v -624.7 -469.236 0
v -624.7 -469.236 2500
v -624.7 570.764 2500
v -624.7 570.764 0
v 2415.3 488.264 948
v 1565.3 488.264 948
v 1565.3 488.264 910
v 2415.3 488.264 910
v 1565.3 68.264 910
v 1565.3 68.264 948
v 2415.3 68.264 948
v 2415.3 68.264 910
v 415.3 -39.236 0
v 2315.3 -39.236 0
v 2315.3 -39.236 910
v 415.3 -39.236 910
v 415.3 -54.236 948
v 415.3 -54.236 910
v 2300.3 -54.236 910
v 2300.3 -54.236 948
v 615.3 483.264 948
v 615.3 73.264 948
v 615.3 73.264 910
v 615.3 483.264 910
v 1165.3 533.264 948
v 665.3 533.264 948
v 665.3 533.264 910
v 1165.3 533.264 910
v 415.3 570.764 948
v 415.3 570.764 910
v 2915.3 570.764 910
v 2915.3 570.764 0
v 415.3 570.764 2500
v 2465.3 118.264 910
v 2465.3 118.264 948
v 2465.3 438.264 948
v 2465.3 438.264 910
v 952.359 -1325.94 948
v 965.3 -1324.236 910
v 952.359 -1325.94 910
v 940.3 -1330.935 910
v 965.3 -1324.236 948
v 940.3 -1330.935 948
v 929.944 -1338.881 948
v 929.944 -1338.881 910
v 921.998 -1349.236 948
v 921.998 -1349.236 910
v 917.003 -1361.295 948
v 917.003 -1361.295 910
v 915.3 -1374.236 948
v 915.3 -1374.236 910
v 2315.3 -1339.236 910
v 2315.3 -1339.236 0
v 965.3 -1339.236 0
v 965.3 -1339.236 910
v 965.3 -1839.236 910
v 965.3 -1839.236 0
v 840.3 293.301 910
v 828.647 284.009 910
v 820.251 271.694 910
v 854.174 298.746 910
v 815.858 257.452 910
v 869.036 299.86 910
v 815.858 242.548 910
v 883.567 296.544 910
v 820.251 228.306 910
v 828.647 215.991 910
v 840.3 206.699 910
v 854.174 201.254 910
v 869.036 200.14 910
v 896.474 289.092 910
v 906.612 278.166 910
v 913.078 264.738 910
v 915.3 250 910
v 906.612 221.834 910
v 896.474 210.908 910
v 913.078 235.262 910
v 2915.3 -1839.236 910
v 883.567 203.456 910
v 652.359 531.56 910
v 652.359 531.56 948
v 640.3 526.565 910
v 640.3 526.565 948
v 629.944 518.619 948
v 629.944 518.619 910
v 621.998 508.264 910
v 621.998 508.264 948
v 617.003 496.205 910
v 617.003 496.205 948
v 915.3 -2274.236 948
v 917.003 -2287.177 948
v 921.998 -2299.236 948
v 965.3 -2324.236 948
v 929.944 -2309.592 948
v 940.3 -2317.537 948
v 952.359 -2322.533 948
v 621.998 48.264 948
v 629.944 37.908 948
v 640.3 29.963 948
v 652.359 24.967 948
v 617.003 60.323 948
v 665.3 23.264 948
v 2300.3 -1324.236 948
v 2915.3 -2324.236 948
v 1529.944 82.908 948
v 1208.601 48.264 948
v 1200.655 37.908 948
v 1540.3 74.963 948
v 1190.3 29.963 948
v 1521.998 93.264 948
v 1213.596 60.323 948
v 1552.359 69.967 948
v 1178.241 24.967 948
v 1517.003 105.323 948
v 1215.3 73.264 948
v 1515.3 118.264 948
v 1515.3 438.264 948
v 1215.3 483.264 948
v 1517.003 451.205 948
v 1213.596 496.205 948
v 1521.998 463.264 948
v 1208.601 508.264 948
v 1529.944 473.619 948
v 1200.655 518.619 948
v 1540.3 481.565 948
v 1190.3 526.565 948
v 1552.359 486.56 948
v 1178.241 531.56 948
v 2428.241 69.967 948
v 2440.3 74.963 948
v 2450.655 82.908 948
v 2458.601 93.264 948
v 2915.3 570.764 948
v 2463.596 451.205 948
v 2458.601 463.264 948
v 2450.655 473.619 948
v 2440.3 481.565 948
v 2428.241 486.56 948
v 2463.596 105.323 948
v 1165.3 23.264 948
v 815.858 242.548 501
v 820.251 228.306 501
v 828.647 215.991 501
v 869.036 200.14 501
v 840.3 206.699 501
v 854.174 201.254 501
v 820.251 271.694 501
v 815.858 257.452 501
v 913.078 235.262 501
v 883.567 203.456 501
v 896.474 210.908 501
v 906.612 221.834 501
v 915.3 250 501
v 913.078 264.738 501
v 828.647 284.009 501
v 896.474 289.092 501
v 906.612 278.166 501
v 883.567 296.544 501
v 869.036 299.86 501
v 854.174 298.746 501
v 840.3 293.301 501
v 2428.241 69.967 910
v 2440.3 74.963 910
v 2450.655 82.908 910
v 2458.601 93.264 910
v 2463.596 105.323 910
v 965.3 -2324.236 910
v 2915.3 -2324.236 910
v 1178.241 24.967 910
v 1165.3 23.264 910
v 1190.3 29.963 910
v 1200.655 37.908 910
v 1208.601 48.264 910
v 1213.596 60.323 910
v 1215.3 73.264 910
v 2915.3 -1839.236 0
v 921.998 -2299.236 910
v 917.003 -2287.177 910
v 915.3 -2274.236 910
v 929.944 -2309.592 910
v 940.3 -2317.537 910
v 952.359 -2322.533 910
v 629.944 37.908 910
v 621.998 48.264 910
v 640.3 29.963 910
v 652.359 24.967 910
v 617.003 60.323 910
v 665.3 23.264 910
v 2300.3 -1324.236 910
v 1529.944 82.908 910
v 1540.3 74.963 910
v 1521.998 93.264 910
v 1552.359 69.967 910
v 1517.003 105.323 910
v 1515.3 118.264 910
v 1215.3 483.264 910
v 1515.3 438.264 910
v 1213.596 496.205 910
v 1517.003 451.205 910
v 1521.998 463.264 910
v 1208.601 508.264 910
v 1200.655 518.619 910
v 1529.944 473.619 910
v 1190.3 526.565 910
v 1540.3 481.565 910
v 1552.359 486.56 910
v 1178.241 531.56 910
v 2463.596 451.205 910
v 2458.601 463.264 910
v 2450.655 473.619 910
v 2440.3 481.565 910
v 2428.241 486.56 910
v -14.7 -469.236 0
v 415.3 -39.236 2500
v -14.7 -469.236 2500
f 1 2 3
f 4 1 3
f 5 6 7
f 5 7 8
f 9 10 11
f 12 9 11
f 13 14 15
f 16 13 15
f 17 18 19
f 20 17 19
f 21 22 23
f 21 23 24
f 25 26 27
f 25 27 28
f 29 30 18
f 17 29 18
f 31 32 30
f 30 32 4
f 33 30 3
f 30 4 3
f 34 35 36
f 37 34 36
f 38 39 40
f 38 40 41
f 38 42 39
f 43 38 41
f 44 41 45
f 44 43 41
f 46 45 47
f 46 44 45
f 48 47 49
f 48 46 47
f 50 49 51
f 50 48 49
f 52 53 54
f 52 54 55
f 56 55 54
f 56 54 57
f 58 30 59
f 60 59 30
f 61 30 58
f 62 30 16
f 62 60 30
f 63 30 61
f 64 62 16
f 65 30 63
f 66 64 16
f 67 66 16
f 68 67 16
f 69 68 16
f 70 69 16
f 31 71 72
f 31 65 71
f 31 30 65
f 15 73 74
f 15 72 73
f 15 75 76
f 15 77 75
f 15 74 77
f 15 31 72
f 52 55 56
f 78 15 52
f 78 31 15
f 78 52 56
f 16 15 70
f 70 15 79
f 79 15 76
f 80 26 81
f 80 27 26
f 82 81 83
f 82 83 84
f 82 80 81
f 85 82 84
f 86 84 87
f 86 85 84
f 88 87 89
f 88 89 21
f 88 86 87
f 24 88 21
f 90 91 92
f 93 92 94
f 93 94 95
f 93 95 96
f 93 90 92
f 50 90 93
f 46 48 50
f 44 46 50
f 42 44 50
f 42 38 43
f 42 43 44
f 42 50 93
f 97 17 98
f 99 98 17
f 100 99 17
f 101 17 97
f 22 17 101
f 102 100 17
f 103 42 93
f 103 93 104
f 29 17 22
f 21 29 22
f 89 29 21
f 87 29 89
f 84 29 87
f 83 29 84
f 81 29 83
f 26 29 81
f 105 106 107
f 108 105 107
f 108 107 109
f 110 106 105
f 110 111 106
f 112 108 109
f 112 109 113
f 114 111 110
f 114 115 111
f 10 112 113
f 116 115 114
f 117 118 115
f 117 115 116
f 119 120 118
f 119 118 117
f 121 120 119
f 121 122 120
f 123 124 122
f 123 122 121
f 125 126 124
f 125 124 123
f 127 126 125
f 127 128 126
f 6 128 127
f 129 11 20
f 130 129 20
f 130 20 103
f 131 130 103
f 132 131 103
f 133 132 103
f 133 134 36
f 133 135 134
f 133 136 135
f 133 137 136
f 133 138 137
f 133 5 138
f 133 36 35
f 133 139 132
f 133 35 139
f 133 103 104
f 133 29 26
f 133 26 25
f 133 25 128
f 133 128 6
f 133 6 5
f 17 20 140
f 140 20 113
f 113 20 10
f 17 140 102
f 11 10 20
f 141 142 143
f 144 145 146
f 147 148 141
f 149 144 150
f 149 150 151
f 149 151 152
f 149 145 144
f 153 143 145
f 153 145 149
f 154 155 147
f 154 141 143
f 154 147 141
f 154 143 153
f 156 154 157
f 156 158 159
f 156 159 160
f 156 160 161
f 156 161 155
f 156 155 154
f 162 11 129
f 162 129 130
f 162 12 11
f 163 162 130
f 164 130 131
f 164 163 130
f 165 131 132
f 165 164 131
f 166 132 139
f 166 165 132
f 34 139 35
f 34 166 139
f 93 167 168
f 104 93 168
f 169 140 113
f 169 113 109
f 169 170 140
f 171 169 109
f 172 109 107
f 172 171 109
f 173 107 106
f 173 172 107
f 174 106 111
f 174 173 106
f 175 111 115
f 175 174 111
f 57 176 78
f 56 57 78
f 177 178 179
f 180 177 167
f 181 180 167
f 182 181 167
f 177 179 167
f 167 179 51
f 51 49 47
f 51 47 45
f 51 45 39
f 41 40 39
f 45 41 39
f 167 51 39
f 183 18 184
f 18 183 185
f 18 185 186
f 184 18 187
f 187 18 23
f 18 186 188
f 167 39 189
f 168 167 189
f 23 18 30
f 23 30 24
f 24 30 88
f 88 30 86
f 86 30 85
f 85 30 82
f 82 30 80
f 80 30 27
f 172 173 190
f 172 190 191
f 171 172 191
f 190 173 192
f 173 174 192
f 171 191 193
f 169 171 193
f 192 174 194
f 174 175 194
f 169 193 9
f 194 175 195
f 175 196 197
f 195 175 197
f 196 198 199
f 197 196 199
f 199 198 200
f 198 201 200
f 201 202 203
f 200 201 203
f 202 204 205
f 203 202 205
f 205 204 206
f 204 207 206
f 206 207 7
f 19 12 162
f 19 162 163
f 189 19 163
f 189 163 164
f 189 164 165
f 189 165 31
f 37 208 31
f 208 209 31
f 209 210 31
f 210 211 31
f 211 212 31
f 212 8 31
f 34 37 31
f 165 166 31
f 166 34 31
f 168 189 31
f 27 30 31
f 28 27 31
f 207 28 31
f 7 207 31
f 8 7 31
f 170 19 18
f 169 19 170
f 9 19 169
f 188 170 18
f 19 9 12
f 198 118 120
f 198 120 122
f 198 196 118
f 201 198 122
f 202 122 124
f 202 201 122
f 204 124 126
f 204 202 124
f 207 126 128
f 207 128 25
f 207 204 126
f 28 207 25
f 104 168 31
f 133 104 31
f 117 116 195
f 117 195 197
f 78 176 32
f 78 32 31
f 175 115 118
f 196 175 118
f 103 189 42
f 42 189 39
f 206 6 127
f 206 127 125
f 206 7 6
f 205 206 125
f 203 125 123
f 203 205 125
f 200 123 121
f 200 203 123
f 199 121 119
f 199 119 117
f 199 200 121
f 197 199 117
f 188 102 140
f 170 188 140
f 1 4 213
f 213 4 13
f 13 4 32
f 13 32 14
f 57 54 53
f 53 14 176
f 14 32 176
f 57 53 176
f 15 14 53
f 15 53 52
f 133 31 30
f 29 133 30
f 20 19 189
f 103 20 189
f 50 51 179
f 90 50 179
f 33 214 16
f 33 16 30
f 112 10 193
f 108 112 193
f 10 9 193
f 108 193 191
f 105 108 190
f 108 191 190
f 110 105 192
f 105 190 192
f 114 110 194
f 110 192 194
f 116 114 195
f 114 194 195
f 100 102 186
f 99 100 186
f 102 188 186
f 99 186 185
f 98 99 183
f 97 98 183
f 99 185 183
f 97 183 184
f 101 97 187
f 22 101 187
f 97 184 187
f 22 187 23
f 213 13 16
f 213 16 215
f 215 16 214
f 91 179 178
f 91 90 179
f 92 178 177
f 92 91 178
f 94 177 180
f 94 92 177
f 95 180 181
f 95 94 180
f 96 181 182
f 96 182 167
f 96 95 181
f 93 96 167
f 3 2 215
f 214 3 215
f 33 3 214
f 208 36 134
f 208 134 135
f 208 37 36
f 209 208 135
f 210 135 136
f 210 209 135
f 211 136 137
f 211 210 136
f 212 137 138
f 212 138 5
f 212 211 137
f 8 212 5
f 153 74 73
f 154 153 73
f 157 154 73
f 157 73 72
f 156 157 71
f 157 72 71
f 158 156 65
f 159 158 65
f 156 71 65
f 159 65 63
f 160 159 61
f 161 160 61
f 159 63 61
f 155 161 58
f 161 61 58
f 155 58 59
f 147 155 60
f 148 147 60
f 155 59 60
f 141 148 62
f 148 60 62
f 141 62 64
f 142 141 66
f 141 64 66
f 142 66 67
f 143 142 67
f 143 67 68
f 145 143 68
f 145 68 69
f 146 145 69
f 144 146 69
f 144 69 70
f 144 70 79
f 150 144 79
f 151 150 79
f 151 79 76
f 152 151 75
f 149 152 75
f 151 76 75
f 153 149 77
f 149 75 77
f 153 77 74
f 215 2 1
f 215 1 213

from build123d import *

# Parameters (mm, degrees)
F0_W      = 1040
F0_H      = 1040
F1_DEPTH  = 2500
F2_SIZE   = 430
F3_W      = 610
F3_H      = 910
F4_DEPTH  = 2500
F5_W      = 600
F5_H      = 910
F6_DEPTH  = 1800
F7_W      = 500
F7_H      = 910
F8_DEPTH  = 1400
F10_DEPTH = 38
F11_R     = 50
F12_W     = 500
F12_H     = 910
F13_DEPTH = 50
F14_R     = 50
F15_DEPTH = 409
F16_W     = 600
F16_H     = 510
F17_DEPTH = 38
F18_R     = 50
F19_W     = 950
F19_H     = 420
F20_DEPTH = 38
F21_R     = 50


with BuildPart() as f1:
    # F0 (on Top) → F1 (new body)
    with BuildSketch(Plane.XY):
        with Locations((-104.700291, 50.763791)):
            Rectangle(F0_W, F0_H)
    extrude(amount=F1_DEPTH)

    # F2
    f2_edges = [f1.edges().sort_by_distance(p)[0] for p in [
        (415.299709, -469.236209, 1250),
    ]]
    chamfer(f2_edges, length=F2_SIZE)

    # F3 (on face) → F4 (join)
    with BuildSketch(Plane.YZ.offset(415.299709)):
        with Locations((265.763791, 455)):
            Rectangle(F3_W, F3_H)
    extrude(amount=F4_DEPTH)

    # F5 (on face) → F6 (join)
    with BuildSketch(Plane.XZ.offset(39.236209)):
        with Locations((2615.299709, 455)):
            Rectangle(F5_W, F5_H)
    extrude(amount=F6_DEPTH)

    # F7 (on face) → F8 (join)
    with BuildSketch(Plane(origin=(2315.299709, 0, 0), x_dir=(0, -1, 0), z_dir=(-1, 0, 0))):
        with Locations((1589.236209, 455)):
            Rectangle(F7_W, F7_H)
    extrude(amount=F8_DEPTH)

    # F12 (on face) → F13 (cut)
    with BuildSketch(Plane(origin=(915.299709, 0, 0), x_dir=(0, -1, 0), z_dir=(-1, 0, 0))):
        with Locations((1589.236209, 455)):
            Rectangle(F12_W, F12_H)
    extrude(amount=-F13_DEPTH, mode=Mode.SUBTRACT)

    # F14 (on face) → F15 (cut)
    with BuildSketch(Plane.XY.offset(910)):
        with Locations((865.299709, 250)):
            Circle(F14_R)
    extrude(amount=-F15_DEPTH, mode=Mode.SUBTRACT)


with BuildPart() as f10:
    # F9 (on face) → F10 (new body)
    with BuildSketch(Plane.XY.offset(910)):
        Polygon((2915.299709, -2324.236209), (2915.299709, -1839.236209), (2915.299709, 570.763791), (415.299709, 570.763791), (415.299709, -54.236209), (2300.299709, -54.236209), (2300.299709, -1324.236209), (915.299709, -1324.236209), (915.299709, -1339.236209), (915.299709, -2324.236209), align=None)
    extrude(amount=F10_DEPTH)

    # F11
    f11_edges = [f10.edges().sort_by_distance(p)[0] for p in [
        (915.299709, -1324.236209, 929),
        (915.299709, -2324.236209, 929),
    ]]
    fillet(f11_edges, radius=F11_R)

    # F16 (on face) → F17 (cut)
    with BuildSketch(Plane.XY.offset(948)):
        with Locations((915.299709, 278.263791)):
            Rectangle(F16_W, F16_H)
    extrude(amount=-F17_DEPTH, mode=Mode.SUBTRACT)

    # F18
    f18_edges = [f10.edges().sort_by_distance(p)[0] for p in [
        (615.299709, 533.263791, 929),
        (615.299709, 23.263791, 929),
        (1215.299709, 23.263791, 929),
        (1215.299709, 533.263791, 929),
    ]]
    fillet(f18_edges, radius=F18_R)

    # F19 (on face) → F20 (cut)
    with BuildSketch(Plane.XY.offset(948)):
        with Locations((1990.299709, 278.263791)):
            Rectangle(F19_W, F19_H)
    extrude(amount=-F20_DEPTH, mode=Mode.SUBTRACT)

    # F21
    f21_edges = [f10.edges().sort_by_distance(p)[0] for p in [
        (1515.299709, 488.263791, 929),
        (2465.299709, 488.263791, 929),
        (1515.299709, 68.263791, 929),
        (2465.299709, 68.263791, 929),
    ]]
    fillet(f21_edges, radius=F21_R)


solid = Compound([f1.part, f10.part])
